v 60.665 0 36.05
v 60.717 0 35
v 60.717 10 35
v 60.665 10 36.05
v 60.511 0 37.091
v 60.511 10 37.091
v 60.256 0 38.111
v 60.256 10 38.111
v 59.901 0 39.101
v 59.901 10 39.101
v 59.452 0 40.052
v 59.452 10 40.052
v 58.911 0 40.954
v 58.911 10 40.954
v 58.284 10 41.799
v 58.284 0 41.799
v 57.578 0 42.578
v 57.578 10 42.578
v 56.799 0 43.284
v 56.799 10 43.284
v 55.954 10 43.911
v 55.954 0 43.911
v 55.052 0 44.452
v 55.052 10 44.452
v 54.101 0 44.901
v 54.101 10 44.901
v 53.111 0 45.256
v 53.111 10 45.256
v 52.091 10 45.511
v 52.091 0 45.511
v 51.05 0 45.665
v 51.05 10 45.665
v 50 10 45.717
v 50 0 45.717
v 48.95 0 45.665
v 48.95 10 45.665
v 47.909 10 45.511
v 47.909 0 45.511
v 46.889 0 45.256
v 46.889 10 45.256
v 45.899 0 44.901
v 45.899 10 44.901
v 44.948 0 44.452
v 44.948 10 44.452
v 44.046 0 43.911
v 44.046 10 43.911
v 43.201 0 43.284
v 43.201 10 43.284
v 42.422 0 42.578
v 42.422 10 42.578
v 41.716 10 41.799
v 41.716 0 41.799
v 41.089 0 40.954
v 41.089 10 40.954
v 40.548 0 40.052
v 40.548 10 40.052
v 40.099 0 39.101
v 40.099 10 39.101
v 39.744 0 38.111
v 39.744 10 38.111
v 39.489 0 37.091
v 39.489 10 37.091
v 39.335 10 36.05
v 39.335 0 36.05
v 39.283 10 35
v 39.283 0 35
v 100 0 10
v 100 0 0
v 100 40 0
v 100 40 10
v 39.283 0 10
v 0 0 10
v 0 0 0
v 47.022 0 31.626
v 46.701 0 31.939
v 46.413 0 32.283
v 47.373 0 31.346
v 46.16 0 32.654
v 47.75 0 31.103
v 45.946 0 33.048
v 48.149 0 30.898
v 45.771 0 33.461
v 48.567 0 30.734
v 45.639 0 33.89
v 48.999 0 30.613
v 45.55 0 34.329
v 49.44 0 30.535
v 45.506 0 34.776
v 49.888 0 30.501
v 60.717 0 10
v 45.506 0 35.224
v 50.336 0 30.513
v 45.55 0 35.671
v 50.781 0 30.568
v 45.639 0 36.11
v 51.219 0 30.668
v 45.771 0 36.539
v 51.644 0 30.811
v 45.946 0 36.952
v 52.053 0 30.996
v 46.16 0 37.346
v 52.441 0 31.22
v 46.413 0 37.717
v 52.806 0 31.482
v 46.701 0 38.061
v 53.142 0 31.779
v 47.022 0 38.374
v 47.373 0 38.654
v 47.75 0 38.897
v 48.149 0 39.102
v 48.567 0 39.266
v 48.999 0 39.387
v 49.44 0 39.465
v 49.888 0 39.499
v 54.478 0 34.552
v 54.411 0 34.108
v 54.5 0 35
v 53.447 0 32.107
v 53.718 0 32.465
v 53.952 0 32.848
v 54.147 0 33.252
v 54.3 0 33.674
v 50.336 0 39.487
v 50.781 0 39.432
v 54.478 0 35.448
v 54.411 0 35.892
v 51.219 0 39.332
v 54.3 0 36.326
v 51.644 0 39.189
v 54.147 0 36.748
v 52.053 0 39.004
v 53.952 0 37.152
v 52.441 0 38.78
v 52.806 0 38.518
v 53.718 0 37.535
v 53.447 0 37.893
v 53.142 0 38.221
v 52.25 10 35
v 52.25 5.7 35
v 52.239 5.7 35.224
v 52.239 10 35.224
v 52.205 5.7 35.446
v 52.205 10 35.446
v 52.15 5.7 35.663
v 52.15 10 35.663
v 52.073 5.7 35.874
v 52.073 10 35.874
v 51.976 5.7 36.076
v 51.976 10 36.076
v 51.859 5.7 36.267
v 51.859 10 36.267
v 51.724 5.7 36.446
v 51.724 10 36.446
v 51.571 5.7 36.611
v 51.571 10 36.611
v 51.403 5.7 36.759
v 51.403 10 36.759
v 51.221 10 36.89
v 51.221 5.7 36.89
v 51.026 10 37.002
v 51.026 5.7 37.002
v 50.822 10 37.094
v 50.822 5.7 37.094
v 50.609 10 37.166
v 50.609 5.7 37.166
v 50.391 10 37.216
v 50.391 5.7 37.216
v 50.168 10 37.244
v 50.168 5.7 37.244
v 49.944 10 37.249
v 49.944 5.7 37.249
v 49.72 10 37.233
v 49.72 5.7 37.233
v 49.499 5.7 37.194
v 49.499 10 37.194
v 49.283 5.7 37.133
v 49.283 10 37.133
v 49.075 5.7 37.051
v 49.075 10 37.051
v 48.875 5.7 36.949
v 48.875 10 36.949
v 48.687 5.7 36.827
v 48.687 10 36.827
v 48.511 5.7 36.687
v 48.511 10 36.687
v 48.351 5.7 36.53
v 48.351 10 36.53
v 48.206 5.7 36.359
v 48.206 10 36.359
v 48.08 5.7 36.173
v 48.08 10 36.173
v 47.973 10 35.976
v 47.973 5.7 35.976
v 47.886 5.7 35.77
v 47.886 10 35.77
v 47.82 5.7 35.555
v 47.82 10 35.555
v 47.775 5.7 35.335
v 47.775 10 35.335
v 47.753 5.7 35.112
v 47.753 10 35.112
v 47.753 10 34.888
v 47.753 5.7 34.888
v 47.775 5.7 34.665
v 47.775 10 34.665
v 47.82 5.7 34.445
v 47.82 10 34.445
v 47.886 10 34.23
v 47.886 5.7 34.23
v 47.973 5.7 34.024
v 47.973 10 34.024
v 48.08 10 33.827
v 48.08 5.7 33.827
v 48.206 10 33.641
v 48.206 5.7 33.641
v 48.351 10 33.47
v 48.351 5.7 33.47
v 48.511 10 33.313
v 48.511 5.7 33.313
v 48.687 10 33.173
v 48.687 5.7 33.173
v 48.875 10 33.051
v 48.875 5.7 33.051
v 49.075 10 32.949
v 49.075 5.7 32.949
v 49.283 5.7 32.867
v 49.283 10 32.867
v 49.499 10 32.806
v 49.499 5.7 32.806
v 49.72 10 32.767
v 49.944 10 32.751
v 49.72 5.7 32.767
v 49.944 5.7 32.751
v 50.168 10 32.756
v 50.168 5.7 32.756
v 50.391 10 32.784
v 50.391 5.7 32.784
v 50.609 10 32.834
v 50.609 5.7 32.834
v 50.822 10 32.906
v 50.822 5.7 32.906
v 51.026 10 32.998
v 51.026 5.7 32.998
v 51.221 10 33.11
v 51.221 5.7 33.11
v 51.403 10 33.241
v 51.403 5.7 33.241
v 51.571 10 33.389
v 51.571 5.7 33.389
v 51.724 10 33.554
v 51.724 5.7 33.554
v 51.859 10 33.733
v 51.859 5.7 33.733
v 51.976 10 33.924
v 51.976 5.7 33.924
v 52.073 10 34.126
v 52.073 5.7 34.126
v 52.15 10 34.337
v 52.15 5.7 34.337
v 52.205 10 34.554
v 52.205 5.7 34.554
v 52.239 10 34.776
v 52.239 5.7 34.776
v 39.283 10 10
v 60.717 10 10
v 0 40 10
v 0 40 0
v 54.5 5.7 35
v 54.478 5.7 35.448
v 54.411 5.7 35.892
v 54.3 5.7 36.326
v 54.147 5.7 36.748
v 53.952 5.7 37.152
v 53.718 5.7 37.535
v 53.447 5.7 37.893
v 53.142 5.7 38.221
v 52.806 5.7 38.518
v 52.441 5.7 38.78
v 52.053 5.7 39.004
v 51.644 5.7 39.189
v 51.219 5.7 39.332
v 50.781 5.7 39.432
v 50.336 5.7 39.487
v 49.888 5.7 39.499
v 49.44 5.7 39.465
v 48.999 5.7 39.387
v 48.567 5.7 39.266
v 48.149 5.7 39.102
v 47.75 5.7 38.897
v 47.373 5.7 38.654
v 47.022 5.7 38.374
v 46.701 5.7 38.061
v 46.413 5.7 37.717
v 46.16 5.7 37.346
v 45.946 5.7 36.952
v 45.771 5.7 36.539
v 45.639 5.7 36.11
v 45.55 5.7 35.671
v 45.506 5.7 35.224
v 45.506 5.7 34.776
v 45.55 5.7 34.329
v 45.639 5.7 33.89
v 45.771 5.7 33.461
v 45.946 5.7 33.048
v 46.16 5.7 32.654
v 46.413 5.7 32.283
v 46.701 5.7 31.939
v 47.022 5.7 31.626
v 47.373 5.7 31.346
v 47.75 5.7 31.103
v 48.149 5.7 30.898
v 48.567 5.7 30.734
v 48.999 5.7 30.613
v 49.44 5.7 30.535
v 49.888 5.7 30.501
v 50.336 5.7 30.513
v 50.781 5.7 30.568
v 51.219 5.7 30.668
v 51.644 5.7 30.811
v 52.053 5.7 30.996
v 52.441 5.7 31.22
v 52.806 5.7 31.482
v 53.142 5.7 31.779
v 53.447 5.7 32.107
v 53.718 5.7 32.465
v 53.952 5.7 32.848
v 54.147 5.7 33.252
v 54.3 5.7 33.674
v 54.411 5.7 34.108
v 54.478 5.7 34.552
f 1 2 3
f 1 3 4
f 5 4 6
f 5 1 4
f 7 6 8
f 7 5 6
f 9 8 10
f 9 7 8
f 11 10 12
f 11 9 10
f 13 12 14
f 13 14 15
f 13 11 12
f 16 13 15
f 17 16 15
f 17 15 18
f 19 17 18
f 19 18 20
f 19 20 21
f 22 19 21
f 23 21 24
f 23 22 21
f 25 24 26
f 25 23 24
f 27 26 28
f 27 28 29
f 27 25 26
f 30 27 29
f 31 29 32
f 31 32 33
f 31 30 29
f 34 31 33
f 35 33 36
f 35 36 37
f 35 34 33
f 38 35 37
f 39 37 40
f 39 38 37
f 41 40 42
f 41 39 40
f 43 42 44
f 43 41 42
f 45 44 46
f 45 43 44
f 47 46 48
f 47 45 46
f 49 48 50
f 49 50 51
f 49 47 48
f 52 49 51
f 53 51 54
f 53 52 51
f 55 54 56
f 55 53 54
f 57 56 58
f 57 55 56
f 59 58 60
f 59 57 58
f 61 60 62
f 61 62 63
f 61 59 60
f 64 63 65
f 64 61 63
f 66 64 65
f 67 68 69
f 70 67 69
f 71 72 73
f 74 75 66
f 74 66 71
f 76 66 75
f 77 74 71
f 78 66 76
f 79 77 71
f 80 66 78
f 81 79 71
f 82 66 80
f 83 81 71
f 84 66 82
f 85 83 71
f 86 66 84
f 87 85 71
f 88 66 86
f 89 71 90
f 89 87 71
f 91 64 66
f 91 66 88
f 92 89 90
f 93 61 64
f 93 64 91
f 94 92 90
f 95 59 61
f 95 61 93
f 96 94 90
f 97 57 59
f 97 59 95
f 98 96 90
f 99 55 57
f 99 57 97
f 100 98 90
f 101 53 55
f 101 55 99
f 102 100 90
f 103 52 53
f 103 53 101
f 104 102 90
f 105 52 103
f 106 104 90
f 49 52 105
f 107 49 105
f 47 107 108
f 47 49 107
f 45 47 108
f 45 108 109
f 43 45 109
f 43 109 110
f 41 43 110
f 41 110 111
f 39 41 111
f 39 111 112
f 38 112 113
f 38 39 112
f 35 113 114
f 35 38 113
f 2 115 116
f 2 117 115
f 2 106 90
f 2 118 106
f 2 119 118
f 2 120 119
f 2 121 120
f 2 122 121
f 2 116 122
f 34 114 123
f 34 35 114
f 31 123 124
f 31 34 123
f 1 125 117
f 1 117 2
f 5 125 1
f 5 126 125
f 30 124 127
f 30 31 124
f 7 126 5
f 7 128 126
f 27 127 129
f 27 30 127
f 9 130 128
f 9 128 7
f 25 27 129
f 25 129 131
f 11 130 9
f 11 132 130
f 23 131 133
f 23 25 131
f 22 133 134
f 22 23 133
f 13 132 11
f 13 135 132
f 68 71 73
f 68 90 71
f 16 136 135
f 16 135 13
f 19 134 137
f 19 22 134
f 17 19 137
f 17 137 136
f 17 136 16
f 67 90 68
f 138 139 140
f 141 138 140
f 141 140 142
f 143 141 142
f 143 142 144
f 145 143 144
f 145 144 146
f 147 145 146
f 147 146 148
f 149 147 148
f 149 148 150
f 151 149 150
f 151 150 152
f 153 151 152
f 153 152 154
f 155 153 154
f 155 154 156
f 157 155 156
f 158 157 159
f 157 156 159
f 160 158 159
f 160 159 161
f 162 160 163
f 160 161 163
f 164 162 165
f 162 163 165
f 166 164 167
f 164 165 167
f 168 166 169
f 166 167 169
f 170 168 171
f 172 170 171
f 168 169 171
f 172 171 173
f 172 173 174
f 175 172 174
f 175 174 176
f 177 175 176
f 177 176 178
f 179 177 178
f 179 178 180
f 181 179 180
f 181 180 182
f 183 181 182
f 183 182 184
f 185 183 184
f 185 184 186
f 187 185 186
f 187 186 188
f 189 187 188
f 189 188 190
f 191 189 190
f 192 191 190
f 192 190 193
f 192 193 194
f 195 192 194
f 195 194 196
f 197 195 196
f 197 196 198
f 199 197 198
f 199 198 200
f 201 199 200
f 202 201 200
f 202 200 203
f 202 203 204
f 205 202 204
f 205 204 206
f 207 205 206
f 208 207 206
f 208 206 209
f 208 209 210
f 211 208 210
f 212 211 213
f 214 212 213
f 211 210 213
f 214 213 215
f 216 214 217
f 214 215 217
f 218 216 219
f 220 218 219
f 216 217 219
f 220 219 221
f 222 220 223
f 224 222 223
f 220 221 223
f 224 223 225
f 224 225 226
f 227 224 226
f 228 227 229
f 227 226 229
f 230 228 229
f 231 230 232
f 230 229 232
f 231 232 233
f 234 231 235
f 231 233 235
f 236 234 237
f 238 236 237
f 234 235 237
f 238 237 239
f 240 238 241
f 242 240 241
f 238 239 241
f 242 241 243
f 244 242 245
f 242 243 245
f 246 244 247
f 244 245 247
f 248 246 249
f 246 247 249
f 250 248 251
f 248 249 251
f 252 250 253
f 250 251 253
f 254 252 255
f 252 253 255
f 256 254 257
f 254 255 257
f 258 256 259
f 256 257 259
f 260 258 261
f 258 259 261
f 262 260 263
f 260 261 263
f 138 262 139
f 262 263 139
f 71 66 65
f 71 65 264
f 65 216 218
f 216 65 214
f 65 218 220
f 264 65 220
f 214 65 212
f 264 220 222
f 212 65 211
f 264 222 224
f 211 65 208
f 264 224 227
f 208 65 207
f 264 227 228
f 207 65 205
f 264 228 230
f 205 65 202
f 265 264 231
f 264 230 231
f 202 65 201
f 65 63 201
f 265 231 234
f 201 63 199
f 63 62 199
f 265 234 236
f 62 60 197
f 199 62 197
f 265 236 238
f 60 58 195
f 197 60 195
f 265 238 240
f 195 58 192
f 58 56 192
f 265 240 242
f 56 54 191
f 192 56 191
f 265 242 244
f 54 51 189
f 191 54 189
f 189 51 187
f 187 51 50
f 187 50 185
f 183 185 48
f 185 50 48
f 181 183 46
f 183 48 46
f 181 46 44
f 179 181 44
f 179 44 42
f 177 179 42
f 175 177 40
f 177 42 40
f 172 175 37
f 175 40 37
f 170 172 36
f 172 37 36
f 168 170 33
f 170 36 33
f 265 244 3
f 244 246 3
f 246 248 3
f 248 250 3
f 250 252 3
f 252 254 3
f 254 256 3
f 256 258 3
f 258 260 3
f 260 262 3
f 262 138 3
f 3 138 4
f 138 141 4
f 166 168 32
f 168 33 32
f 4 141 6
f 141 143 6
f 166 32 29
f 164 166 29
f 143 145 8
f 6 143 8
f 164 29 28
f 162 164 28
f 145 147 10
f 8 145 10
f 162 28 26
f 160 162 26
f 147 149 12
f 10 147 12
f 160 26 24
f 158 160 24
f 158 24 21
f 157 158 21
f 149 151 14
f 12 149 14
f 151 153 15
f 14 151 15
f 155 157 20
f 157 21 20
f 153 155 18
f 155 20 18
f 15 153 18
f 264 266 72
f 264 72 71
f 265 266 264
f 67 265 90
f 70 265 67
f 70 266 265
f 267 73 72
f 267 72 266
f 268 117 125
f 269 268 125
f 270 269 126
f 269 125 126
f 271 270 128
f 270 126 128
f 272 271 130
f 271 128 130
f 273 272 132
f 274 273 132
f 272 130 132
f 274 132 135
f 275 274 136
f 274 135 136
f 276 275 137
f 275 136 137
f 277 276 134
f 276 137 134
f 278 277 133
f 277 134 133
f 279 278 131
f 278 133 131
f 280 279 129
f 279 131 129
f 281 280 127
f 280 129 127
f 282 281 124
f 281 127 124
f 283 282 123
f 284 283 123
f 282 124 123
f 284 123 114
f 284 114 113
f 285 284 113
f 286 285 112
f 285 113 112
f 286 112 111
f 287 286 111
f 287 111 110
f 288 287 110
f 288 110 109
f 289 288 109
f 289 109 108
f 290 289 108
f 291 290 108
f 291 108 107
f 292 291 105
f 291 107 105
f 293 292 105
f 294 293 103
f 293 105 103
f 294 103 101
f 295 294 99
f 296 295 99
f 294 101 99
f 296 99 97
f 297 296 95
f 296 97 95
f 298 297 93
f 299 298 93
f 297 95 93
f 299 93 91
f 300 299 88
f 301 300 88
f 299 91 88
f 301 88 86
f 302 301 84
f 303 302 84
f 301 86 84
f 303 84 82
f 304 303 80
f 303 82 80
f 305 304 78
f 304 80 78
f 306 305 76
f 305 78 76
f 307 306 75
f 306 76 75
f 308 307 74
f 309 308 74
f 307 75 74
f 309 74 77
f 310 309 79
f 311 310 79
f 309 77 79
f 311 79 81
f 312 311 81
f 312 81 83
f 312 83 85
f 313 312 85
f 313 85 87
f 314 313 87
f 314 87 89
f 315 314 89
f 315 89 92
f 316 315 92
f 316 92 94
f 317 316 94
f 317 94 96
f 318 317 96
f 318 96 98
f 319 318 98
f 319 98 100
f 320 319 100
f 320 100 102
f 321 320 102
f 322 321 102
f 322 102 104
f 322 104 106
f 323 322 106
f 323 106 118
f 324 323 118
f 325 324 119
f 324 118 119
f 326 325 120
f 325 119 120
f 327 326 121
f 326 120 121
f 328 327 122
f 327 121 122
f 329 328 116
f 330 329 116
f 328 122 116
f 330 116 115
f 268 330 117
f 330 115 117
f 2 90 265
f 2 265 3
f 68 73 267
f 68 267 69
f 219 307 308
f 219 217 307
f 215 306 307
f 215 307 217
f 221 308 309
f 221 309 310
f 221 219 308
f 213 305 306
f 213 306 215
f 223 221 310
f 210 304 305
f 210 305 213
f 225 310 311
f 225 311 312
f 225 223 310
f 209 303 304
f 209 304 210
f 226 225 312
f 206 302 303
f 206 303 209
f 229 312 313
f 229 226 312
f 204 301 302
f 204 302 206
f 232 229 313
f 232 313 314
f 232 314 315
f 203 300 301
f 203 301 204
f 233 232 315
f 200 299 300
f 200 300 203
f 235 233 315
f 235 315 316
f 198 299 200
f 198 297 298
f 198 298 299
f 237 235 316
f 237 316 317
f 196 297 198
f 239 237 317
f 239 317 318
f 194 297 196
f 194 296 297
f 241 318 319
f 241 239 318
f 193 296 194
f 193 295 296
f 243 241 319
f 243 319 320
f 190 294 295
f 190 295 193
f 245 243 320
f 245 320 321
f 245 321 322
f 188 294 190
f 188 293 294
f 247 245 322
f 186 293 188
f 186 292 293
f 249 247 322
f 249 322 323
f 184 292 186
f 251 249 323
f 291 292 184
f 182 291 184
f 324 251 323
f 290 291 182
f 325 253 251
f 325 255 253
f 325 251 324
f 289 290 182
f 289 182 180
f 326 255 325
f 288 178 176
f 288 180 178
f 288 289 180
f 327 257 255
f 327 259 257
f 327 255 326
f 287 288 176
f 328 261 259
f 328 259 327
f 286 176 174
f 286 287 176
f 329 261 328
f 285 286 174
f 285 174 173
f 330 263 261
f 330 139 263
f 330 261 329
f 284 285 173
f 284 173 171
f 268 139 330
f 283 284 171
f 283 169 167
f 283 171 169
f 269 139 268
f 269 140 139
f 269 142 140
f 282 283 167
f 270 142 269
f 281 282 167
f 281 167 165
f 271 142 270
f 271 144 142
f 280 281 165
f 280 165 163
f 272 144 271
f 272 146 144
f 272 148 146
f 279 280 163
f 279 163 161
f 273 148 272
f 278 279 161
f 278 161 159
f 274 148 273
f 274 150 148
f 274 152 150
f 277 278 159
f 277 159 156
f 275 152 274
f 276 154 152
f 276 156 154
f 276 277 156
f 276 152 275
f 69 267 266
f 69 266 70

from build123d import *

# Parameters (mm, degrees)
F0_W     = 100
F0_H     = 40
F1_DEPTH = 10
F3_DEPTH = 10
F4_R     = 2.25
F5_DEPTH = 40.001
F6_R     = 4.5
F7_DEPTH = 5.7


with BuildPart() as f1:
    # F0 (on Top) → F1 (new body)
    with BuildSketch(Plane.XY):
        with Locations((50, 20)):
            Rectangle(F0_W, F0_H)
    extrude(amount=F1_DEPTH)

    # F2 (on face) → F3 (join)
    with BuildSketch(Plane.XZ):
        with BuildLine():
            Line((39.282996, 35), (39.282996, 0))
            Line((39.282996, 0), (60.717004, 0))
            Line((60.717004, 0), (60.717004, 35))
            ThreePointArc((60.717004, 35), (50, 45.717004), (39.282996, 35))
        make_face()
    extrude(amount=-F3_DEPTH)

    # F4 (on face) → F5 (cut, through all)
    with BuildSketch(Plane.XZ):
        with Locations((50, 35)):
            Circle(F4_R)
    extrude(amount=-F5_DEPTH, mode=Mode.SUBTRACT)

    # F6 (on face) → F7 (cut)
    with BuildSketch(Plane.XZ):
        with Locations((50, 35)):
            Circle(F6_R)
    extrude(amount=-F7_DEPTH, mode=Mode.SUBTRACT)


solid = f1.part
